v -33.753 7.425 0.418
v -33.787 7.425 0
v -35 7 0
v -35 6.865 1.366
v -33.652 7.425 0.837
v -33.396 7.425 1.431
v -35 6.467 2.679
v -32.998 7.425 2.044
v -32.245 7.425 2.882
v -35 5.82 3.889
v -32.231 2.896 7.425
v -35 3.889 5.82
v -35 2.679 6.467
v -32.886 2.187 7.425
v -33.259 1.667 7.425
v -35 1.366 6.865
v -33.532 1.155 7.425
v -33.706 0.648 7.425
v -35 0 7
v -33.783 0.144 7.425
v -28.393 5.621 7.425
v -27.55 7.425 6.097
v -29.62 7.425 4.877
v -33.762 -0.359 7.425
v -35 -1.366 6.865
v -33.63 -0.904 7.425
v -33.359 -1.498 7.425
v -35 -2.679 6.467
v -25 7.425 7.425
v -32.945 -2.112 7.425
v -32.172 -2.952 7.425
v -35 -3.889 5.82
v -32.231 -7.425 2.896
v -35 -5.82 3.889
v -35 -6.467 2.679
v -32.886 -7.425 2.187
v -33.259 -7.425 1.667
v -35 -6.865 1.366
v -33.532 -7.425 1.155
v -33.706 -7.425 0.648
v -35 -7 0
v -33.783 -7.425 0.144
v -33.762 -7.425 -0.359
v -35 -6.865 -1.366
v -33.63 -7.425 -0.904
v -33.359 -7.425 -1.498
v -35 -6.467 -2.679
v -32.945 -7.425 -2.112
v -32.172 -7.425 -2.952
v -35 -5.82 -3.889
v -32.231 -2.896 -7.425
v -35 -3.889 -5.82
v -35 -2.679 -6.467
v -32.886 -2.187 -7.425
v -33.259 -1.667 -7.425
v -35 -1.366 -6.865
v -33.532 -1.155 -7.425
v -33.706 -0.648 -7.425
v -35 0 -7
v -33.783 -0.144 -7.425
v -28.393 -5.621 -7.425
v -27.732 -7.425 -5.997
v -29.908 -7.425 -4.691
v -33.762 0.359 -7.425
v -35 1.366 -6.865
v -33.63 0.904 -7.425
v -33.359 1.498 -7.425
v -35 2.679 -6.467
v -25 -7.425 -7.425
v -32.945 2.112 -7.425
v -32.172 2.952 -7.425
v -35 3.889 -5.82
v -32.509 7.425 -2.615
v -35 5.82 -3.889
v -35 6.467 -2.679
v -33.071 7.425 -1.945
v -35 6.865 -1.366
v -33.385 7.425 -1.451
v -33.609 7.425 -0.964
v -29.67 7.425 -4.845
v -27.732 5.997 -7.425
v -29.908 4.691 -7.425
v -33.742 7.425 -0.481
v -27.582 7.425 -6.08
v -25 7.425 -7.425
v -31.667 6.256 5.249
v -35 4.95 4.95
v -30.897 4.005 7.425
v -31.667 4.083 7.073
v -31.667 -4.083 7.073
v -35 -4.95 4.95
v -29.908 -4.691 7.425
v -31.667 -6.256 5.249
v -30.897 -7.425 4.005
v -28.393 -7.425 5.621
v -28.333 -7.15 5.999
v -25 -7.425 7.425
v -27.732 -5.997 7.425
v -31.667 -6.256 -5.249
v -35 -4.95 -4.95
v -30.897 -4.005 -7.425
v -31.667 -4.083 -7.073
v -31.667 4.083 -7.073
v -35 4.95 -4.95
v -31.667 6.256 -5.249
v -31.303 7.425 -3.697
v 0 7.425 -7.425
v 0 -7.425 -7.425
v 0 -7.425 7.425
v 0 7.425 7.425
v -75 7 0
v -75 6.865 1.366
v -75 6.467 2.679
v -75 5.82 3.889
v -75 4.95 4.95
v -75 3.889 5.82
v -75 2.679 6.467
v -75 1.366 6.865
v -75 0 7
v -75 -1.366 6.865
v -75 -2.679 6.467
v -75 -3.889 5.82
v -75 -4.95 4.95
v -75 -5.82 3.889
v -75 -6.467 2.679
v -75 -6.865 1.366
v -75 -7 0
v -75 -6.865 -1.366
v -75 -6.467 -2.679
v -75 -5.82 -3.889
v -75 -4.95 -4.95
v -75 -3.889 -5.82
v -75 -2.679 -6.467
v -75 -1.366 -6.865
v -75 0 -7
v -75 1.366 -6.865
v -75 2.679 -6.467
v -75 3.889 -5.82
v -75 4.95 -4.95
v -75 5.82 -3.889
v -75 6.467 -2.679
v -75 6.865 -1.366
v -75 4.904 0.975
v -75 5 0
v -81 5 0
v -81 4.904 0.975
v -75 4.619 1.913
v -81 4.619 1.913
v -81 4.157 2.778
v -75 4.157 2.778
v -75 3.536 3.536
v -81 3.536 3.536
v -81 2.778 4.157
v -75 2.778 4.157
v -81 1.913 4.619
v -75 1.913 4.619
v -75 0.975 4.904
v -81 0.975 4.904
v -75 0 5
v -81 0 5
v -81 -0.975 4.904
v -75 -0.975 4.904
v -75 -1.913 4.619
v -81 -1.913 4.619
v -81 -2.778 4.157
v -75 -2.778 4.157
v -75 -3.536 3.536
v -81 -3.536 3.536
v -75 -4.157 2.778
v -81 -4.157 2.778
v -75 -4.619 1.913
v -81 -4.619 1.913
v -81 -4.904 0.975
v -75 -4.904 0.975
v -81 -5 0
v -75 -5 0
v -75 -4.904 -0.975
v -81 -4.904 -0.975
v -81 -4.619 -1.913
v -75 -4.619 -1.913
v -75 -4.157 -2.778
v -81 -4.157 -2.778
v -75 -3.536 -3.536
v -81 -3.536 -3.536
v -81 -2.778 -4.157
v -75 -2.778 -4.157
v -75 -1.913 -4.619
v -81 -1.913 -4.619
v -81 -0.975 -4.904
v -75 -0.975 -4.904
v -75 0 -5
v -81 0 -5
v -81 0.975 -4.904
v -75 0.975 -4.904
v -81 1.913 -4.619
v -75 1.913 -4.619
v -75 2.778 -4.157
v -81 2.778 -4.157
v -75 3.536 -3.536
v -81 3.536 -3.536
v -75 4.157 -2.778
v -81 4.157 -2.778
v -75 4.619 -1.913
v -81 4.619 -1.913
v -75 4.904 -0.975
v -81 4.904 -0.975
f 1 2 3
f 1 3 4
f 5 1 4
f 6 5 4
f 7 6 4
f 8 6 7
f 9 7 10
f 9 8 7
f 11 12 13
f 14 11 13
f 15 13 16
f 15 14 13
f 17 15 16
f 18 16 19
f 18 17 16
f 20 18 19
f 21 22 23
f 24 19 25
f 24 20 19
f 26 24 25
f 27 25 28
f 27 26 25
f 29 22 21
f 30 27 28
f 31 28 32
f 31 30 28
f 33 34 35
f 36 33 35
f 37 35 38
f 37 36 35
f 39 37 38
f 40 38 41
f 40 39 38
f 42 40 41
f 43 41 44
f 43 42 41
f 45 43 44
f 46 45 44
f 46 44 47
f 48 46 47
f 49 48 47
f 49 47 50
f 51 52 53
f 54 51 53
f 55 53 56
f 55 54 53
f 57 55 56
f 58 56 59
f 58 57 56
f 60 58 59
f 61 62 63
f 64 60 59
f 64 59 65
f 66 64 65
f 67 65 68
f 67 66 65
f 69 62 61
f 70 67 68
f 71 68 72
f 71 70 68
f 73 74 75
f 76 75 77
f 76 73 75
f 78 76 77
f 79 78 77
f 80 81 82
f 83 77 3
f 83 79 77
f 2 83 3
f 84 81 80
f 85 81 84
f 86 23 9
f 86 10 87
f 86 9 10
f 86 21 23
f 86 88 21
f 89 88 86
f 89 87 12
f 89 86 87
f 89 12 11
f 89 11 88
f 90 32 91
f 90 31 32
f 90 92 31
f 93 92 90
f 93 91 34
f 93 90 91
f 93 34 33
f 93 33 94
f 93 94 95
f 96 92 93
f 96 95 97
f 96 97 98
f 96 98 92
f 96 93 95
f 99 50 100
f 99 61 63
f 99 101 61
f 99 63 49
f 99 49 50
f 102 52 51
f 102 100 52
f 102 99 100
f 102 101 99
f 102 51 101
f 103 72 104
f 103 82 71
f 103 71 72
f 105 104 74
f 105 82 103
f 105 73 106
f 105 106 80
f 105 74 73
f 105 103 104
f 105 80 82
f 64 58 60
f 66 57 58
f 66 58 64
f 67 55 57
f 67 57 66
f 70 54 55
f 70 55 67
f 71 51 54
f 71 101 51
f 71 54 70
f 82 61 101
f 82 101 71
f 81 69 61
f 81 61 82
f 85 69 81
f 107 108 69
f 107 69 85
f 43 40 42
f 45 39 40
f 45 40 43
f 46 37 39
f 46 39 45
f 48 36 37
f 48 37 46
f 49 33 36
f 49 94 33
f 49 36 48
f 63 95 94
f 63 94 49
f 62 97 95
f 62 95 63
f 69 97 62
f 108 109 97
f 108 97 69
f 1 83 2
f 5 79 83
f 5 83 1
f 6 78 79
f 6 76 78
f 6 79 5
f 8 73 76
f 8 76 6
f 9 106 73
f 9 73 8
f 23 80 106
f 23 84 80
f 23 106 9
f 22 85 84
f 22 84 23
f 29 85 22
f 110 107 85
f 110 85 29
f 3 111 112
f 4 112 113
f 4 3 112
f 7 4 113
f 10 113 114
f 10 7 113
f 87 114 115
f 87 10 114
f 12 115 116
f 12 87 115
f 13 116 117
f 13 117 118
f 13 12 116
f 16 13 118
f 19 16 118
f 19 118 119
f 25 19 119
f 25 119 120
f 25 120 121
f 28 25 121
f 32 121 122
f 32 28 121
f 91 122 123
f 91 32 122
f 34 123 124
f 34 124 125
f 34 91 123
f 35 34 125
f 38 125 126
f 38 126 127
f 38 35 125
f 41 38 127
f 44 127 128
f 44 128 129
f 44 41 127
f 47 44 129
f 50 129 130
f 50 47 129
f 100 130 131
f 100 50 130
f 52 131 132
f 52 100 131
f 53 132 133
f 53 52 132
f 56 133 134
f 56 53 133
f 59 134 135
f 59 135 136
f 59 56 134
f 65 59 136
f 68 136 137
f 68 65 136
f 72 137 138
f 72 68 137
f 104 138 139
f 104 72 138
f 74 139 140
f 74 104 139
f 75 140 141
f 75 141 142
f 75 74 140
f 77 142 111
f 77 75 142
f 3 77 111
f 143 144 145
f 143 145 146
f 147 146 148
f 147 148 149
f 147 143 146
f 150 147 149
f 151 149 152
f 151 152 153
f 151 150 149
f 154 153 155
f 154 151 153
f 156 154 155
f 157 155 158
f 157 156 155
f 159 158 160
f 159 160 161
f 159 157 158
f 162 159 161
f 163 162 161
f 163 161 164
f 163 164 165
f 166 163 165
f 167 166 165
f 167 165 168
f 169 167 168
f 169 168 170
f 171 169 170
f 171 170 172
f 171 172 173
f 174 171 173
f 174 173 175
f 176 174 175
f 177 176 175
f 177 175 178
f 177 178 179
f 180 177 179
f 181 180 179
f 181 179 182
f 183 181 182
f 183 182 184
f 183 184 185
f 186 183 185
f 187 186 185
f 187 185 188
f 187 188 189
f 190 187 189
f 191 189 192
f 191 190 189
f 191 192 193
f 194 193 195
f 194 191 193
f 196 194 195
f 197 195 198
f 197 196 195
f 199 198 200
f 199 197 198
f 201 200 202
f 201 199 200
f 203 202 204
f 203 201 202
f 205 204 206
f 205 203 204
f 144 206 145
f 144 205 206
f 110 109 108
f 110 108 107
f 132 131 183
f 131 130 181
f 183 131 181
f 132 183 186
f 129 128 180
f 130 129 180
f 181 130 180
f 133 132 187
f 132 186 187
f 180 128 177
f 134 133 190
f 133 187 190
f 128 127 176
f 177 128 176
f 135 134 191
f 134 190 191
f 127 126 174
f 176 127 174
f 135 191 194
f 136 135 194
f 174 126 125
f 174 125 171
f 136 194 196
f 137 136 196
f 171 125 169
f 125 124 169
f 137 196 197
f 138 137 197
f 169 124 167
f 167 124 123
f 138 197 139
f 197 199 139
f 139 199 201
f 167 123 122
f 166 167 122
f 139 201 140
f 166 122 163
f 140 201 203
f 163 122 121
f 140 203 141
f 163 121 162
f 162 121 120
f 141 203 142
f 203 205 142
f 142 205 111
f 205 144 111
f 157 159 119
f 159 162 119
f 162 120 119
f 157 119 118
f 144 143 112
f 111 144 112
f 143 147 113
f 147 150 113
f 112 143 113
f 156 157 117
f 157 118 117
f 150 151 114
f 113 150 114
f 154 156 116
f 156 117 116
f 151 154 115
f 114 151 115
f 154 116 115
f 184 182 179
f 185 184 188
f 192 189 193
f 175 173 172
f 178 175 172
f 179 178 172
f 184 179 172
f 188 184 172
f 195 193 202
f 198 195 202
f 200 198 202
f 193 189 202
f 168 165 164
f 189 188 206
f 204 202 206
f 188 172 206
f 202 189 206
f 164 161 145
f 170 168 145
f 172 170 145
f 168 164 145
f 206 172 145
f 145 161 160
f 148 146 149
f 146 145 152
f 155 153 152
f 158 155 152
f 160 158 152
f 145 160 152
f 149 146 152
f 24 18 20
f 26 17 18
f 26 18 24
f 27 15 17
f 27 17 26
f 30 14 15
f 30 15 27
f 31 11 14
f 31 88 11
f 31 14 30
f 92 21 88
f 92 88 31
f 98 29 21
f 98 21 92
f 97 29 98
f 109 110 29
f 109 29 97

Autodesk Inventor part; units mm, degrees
ref_plane "YZ Plane" through (0, 0, 0) normal (1, 0, 0) x (0, 1, 0)
ref_plane "XZ Plane" through (0, 0, 0) normal (0, 1, 0) x (-1, 0, 0)
ref_plane "XY Plane" through (0, 0, 0) normal (0, 0, 1) x (1, 0, 0)
sketch "Sketch1" plane through (0, 0, 0) normal (0, 0, 1) x (1, 0, 0)
  line L0 (0, 0) -> (-81, 0)
  line L1 (-81, 0) -> (-81, 5)
  line L2 (-81, 5) -> (-75, 5)
  line L3 (-75, 5) -> (-75, 7)
  line L4 (-75, 7) -> (-35, 7)
  line L5 (-35, 7) -> (-25, 10.5)
  line L6 (-25, 10.5) -> (0, 10.5)
  line L7 (0, 10.5) -> (0, 0)
  line L8 (-97.2, 0) -> (16.2, 0) projected
  dimension "d7" = 5
  dimension "d8" = 6
  dimension "d9" = 7
  dimension "d10" = 25
  dimension "d11" = 50
  dimension "d12" = 10
  dimension "d13" = 10.5
revolve "Revolution1" add sketch "Sketch1" angle 360 about axis through (-10, 0, 0) along (1, 0, 0)
thread "Thread1" size "M14x2" class "6g" standard "ANSI Metric M Profile" full length
sketch "Sketch2" plane through (0, 0, 0) normal (1, 0, 0) x (0, 0, -1)
  circle A0 centre (0, 0) radius 10.5 projected
  line L0 (-7.4246, -7.4246) -> (7.4246, -7.4246)
  line L1 (7.4246, -7.4246) -> (7.4246, 7.4246)
  line L2 (7.4246, 7.4246) -> (-7.4246, 7.4246)
  line L3 (-7.4246, 7.4246) -> (-7.4246, -7.4246)
  line L4 (-7.4246, -7.4246) -> (7.4246, 7.4246) construction
  line L5 (7.4246, -7.4246) -> (-7.4246, 7.4246) construction
  circle A1 centre (0, 0) radius 20.6149
extrude "Extrusion1" cut sketch "Sketch2" against normal up to next contours A0 L1 | L2 A0 | A0 L0 | L3 A0 | A1
properties part number "tool clamping screw"
